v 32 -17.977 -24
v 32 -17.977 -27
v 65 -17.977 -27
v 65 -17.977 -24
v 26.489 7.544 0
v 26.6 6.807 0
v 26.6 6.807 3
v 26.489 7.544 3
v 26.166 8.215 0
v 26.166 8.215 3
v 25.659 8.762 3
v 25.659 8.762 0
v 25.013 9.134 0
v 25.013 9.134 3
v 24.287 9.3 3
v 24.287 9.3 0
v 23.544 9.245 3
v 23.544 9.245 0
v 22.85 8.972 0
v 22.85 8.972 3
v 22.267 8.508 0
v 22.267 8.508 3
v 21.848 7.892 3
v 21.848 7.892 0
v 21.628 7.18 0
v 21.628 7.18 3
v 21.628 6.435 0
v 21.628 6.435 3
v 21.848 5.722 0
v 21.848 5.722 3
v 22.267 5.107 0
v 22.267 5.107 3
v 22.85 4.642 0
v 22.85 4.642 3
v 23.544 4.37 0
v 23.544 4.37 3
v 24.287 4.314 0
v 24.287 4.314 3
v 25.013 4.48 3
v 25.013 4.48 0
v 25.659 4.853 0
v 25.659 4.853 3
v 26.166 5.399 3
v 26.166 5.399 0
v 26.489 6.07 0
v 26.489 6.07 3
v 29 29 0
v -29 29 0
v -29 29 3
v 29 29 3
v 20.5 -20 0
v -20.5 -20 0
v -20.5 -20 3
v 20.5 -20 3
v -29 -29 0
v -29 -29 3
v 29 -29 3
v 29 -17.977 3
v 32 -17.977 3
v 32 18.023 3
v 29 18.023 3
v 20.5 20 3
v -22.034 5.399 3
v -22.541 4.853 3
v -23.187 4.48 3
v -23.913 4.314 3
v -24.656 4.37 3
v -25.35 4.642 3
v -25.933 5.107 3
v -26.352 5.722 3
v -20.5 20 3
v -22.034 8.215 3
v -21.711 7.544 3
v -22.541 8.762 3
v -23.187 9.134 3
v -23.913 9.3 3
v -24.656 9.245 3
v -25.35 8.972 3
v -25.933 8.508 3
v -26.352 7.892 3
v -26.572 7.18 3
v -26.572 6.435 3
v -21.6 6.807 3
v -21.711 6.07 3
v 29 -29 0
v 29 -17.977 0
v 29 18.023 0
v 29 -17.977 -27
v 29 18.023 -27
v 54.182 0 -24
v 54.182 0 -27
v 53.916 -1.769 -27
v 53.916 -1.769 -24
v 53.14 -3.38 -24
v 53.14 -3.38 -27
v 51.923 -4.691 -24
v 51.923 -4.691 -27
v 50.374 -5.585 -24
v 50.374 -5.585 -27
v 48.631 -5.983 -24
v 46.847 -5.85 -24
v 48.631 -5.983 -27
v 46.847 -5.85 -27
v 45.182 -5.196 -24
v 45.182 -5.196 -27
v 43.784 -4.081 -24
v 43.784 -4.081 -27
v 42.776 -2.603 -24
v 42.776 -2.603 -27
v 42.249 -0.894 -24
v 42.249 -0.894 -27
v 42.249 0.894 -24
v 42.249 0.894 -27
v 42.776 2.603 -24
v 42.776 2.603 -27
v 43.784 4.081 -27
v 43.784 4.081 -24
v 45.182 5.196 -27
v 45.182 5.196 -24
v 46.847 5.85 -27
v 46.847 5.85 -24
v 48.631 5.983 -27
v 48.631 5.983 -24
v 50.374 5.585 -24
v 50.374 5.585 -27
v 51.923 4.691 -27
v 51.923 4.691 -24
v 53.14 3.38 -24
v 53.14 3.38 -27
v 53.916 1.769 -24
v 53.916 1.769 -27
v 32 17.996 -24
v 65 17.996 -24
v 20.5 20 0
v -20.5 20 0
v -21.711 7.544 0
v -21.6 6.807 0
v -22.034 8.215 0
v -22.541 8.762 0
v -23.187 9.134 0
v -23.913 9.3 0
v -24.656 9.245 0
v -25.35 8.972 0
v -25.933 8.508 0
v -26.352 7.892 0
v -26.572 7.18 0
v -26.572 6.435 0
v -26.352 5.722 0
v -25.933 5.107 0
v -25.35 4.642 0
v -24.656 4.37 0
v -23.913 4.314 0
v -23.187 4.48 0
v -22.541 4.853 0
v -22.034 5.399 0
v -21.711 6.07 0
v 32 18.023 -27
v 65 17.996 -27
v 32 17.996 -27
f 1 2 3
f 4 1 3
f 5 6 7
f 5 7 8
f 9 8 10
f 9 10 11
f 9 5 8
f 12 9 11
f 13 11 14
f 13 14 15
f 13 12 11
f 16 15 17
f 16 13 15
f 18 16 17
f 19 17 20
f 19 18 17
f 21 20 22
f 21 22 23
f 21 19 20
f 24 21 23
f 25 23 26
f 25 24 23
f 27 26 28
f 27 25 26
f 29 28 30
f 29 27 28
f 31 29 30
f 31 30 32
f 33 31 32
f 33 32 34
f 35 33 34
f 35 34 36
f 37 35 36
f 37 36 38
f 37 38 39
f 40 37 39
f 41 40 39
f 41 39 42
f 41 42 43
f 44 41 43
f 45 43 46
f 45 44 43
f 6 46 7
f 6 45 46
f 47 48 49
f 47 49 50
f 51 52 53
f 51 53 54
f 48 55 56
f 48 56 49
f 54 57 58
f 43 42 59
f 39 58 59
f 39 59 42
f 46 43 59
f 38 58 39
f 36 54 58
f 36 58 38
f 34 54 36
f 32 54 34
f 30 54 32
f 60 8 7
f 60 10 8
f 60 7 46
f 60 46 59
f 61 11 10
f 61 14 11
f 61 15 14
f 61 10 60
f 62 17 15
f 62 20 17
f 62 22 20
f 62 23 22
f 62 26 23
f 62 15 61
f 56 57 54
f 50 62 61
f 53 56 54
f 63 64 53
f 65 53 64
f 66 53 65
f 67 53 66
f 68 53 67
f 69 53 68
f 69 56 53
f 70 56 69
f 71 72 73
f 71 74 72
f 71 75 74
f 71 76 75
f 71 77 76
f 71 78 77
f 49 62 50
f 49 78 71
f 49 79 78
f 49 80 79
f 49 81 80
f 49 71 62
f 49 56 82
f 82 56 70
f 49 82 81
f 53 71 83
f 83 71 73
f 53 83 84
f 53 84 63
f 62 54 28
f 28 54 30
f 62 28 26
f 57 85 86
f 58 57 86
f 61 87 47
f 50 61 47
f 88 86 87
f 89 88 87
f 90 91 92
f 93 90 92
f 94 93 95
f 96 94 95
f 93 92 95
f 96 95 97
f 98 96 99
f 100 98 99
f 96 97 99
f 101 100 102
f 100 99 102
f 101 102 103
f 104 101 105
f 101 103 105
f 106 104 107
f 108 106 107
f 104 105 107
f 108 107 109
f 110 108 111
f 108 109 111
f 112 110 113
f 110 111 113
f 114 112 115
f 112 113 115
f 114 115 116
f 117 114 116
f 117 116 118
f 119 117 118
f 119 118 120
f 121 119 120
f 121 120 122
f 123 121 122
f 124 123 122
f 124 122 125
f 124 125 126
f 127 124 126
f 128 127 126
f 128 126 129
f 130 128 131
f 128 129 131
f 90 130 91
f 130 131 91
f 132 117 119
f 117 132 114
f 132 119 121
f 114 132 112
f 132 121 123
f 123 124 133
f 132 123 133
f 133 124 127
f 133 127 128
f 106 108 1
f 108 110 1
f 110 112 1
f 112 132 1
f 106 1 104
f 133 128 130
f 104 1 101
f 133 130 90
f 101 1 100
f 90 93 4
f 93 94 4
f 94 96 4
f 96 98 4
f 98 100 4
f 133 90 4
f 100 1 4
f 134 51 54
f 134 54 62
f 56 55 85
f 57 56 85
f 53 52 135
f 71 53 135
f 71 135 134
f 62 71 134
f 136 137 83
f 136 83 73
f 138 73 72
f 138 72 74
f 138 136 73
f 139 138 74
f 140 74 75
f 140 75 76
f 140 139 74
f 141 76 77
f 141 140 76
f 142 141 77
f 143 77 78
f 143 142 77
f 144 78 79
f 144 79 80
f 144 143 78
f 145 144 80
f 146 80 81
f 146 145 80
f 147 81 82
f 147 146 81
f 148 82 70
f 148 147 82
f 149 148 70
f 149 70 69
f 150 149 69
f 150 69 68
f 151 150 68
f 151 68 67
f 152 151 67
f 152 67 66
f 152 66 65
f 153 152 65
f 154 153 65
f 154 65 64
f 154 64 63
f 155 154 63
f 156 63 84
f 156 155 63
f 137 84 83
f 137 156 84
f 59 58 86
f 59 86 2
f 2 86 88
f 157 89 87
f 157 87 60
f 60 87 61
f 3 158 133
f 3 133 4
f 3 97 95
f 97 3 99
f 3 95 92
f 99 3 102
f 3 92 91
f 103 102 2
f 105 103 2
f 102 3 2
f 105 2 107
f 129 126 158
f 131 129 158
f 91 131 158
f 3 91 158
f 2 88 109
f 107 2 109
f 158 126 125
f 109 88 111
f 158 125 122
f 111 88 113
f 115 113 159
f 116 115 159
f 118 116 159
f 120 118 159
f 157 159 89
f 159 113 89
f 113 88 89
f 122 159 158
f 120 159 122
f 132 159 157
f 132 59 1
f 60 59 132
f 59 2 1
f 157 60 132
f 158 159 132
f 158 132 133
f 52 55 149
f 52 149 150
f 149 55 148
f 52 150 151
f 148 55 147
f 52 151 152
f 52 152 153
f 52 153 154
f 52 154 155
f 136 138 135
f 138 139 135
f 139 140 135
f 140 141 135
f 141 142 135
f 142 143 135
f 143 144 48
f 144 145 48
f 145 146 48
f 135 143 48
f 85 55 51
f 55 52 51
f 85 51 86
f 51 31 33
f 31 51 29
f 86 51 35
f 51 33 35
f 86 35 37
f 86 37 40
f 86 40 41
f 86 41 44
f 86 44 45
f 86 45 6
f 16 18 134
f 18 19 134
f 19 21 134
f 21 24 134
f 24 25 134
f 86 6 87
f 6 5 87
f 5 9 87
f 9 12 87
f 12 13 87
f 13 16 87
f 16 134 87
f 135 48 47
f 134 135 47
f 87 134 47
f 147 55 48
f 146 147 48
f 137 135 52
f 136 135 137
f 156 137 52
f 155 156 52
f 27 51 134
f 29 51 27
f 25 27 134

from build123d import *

# Parameters (mm, degrees)
F0_W     = 58
F0_H     = 58
F0_R     = 2.5
F0_W_2   = 41
F0_H_2   = 40
F1_DEPTH = 3
F2_W     = 36
F2_H     = 27
F2_H_2   = 3
F3_DEPTH = 3
F4_W     = 33
F4_H     = 35.972737
F4_R     = 6
F5_DEPTH = 3


with BuildPart() as f1:
    # F0 (on Top) → F1 (new body)
    with BuildSketch(Plane.XY):
        Rectangle(F0_W, F0_H)
        with Locations((-24.1, 6.807183)):
            Circle(F0_R, mode=Mode.SUBTRACT)
        Rectangle(F0_W_2, F0_H_2, mode=Mode.SUBTRACT)
        with Locations((24.1, 6.807183)):
            Circle(F0_R, mode=Mode.SUBTRACT)
    extrude(amount=F1_DEPTH)

    # F2 (on face) → F3 (join)
    with BuildSketch(Plane.YZ.offset(29)):
        with Locations((0.023433, -13.5)):
            Rectangle(F2_W, F2_H)
        with Locations((0.023433, 1.5)):
            Rectangle(F2_W, F2_H_2)
    extrude(amount=F3_DEPTH)

    # F4 (on face) → F5 (join)
    with BuildSketch(Plane(origin=(0, 0, -27), x_dir=(1, 0, 0), z_dir=(0, 0, -1))):
        with Locations((48.5, -0.009802)):
            Rectangle(F4_W, F4_H)
        with Locations((48.182182, 0)):
            Circle(F4_R, mode=Mode.SUBTRACT)
    extrude(amount=-F5_DEPTH)


solid = f1.part
